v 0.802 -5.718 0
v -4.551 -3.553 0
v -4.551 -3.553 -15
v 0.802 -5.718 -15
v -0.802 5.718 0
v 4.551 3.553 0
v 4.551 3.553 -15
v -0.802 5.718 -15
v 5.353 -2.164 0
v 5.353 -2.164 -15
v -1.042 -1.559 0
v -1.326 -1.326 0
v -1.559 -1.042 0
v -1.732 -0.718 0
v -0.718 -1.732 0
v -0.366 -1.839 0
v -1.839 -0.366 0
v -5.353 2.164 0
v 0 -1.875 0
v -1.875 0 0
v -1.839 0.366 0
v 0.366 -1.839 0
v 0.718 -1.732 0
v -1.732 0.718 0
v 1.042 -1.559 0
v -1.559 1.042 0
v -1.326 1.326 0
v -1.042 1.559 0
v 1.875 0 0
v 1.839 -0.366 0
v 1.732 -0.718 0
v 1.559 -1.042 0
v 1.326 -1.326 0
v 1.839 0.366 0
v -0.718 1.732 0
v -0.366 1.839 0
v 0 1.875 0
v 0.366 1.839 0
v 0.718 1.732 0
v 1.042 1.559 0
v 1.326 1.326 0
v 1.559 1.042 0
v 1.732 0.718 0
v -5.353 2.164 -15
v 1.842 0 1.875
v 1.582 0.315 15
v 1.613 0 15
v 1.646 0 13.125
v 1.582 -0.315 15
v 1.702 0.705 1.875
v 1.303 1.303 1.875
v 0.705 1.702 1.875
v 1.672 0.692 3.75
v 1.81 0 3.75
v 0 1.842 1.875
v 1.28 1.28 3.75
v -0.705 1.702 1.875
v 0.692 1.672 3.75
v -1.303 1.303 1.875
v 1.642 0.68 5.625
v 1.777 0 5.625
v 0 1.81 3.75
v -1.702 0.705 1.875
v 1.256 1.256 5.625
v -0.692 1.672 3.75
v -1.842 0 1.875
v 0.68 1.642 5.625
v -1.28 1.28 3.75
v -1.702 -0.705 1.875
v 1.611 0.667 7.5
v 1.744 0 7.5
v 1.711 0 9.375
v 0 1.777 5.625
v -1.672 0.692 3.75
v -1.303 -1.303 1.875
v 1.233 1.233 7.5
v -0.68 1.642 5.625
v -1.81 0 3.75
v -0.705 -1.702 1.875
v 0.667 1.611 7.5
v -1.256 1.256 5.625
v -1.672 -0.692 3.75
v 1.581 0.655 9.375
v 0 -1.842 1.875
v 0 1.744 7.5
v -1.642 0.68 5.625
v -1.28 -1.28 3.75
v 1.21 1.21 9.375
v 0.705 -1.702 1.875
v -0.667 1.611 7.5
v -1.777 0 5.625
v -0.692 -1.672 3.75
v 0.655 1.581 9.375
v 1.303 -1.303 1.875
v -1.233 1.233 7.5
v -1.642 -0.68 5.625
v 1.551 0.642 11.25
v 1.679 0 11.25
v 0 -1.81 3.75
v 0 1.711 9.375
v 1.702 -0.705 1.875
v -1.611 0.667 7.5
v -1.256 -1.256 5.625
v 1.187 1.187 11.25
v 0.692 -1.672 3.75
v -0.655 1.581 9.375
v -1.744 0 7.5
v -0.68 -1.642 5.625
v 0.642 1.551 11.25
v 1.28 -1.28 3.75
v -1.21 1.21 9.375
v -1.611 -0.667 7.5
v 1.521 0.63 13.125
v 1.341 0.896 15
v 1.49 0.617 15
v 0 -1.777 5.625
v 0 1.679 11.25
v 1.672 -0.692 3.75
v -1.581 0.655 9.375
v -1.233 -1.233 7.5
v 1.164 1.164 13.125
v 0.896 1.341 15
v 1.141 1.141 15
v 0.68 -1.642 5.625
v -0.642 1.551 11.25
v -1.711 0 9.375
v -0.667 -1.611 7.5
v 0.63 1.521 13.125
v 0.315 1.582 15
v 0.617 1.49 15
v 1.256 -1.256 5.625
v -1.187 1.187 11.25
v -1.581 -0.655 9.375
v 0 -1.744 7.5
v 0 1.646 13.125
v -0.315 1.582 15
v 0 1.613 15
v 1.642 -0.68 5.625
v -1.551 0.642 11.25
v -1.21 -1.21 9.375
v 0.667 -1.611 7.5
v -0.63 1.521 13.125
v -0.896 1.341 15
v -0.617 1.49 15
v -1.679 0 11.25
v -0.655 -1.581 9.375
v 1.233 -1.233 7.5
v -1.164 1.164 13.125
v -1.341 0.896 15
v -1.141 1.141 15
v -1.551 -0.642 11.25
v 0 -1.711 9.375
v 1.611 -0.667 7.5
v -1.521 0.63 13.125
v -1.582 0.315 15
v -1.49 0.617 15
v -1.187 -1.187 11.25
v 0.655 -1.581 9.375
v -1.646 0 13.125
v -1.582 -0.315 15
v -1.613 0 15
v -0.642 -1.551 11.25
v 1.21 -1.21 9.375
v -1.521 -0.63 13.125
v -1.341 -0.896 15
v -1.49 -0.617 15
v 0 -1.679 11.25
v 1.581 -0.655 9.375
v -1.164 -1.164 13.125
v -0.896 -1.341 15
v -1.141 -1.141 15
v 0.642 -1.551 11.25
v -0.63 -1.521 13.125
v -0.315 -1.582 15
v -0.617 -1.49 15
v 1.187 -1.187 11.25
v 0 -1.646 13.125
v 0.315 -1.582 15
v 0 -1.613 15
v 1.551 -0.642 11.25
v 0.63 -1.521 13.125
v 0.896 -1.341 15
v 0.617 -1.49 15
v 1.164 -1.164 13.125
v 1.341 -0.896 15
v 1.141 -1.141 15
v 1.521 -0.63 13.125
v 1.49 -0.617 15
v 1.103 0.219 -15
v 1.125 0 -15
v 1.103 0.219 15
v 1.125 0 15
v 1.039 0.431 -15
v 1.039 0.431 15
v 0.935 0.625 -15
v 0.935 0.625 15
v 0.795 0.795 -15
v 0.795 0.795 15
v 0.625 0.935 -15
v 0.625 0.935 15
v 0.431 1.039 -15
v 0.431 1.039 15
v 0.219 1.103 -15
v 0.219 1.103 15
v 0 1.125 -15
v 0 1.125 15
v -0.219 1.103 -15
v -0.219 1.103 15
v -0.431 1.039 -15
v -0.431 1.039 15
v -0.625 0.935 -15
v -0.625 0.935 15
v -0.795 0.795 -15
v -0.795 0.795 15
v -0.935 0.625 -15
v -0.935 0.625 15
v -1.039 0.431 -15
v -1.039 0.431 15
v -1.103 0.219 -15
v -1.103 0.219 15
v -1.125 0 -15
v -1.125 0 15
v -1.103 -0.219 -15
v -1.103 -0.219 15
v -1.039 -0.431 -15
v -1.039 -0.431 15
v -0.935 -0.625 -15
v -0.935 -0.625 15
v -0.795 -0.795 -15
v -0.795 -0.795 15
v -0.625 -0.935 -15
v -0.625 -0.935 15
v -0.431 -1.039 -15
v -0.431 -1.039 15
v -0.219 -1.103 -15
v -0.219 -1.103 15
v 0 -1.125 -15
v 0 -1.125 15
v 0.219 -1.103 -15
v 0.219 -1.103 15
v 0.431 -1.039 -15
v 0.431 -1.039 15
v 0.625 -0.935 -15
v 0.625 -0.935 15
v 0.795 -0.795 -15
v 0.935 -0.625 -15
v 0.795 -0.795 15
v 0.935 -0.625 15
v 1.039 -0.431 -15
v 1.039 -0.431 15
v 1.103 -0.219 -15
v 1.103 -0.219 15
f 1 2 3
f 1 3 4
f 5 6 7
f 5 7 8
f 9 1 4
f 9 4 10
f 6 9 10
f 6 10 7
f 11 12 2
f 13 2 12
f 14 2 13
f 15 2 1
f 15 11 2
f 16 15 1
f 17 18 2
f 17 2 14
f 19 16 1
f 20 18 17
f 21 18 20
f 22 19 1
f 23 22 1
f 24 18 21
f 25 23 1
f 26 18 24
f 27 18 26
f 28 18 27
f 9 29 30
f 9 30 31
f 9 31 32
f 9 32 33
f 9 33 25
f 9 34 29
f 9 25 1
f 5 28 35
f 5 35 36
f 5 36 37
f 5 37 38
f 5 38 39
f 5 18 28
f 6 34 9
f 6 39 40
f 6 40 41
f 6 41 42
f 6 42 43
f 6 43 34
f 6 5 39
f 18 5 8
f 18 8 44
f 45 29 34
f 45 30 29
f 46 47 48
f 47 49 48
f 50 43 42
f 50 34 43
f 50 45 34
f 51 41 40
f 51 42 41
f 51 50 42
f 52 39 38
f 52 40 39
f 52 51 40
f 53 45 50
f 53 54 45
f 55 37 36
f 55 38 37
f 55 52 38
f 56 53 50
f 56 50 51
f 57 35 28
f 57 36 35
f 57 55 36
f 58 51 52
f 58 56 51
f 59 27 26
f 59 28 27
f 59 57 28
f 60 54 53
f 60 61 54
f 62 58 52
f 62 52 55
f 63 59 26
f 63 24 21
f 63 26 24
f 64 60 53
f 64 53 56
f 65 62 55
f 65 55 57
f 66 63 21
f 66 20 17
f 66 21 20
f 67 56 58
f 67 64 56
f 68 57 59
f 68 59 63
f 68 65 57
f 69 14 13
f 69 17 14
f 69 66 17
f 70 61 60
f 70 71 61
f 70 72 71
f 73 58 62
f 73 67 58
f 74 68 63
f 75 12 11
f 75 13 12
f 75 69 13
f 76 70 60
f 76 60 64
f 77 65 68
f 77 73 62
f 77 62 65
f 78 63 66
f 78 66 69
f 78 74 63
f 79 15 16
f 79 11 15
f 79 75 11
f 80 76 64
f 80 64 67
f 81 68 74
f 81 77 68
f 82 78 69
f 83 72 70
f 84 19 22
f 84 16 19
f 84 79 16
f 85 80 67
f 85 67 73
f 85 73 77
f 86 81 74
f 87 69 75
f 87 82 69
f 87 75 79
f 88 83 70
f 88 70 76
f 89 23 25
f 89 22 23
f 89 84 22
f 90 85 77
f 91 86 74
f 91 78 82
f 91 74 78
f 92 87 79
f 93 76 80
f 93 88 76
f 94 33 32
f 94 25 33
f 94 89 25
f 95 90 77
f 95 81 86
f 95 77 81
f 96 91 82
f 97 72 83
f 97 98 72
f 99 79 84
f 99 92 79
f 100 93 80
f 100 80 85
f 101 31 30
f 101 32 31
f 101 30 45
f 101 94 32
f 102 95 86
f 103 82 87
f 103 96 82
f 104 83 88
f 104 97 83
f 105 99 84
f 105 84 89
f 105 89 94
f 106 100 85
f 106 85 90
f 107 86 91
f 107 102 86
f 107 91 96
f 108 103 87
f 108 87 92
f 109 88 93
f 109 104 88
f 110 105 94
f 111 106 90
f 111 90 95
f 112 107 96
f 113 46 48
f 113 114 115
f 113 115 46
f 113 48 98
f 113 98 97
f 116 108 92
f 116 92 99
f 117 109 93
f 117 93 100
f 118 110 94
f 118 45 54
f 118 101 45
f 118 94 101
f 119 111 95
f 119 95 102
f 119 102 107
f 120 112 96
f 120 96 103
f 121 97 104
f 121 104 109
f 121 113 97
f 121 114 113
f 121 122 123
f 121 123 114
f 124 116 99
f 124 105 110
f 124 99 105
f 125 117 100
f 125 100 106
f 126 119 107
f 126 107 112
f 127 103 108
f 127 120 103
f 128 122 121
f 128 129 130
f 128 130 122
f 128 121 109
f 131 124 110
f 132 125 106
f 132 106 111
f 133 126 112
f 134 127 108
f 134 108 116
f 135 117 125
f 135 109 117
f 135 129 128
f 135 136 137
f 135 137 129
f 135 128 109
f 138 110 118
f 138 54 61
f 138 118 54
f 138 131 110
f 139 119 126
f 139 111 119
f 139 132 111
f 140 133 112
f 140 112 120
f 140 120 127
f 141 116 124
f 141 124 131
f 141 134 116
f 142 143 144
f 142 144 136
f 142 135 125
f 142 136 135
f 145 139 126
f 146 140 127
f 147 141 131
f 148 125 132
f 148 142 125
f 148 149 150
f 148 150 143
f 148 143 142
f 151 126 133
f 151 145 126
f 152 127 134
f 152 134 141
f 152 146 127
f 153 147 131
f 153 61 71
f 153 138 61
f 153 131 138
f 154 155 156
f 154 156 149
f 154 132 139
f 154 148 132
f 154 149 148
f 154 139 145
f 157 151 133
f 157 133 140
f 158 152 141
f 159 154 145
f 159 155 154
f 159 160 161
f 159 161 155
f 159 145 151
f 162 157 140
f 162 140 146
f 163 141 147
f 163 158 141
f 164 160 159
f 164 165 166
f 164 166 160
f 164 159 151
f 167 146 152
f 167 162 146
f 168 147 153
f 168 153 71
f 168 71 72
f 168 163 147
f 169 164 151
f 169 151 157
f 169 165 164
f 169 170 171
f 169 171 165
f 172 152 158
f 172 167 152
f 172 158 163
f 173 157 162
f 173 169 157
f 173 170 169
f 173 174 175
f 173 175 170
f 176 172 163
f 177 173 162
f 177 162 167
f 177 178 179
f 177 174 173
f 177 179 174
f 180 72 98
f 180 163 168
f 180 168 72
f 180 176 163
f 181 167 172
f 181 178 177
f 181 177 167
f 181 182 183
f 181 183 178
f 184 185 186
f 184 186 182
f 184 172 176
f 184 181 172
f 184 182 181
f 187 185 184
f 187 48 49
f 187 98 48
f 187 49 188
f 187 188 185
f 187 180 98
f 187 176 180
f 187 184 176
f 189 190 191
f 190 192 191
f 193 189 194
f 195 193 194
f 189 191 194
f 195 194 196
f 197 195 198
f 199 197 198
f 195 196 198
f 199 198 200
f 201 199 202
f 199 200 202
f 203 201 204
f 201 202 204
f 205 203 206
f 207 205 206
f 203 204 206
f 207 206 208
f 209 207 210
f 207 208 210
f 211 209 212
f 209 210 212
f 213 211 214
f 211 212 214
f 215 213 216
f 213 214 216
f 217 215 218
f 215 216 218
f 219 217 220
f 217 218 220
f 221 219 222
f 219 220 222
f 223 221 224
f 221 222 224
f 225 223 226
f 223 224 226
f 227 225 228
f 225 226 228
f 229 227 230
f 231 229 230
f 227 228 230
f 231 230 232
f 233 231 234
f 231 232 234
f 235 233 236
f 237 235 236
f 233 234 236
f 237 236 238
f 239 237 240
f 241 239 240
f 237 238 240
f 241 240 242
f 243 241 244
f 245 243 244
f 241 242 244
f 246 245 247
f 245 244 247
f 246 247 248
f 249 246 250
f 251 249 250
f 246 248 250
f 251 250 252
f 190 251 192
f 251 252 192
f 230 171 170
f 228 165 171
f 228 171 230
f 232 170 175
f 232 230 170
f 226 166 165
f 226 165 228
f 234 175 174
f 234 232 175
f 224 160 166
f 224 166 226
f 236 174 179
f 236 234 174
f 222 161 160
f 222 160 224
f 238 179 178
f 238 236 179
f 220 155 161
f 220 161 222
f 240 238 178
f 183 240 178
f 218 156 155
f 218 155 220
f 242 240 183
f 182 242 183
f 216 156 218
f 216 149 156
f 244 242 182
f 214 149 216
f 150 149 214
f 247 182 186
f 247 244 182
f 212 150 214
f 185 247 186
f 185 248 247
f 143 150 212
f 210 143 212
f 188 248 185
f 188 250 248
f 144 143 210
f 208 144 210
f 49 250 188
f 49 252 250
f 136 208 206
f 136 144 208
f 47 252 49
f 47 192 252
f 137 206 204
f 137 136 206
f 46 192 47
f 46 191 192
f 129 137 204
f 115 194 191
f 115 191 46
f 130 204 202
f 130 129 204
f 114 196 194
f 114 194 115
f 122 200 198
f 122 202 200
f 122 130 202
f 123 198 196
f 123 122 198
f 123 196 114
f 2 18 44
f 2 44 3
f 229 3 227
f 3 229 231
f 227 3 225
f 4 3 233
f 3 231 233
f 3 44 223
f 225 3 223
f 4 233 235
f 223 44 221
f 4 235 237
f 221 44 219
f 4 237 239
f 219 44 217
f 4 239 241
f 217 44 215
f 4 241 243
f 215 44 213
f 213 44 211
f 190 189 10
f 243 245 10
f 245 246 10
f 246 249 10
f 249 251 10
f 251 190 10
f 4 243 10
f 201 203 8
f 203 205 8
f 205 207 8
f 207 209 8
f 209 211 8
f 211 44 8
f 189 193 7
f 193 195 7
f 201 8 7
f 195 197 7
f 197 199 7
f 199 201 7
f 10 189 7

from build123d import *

# Parameters (mm, degrees)
F0_R     = 1.875
F1_DEPTH = 15
F1_TAPER = 1
F3_DEPTH = 15
F4_R     = 1.125
F5_DEPTH = 25


with BuildPart() as f1:
    # F0 (on Top) → F1 (new body)
    with BuildSketch(Plane.XY):
        Circle(F0_R)
    extrude(amount=F1_DEPTH, taper=F1_TAPER)

    # F2 (on Top) → F3 (join)
    with BuildSketch(Plane.XY):
        Polygon((4.5505611026, 3.5532699003), (-0.8019414489, 5.7175364665), (-5.3525025515, 2.1642665662), (-4.5505611026, -3.5532699003), (0.8019414489, -5.7175364665), (5.3525025515, -2.1642665662), align=None)
    extrude(amount=-F3_DEPTH)

    # F4 (on Top) → F5 (cut, symmetric)
    with BuildSketch(Plane.XY):
        Circle(F4_R)
    extrude(amount=F5_DEPTH, both=True, mode=Mode.SUBTRACT)


solid = f1.part
